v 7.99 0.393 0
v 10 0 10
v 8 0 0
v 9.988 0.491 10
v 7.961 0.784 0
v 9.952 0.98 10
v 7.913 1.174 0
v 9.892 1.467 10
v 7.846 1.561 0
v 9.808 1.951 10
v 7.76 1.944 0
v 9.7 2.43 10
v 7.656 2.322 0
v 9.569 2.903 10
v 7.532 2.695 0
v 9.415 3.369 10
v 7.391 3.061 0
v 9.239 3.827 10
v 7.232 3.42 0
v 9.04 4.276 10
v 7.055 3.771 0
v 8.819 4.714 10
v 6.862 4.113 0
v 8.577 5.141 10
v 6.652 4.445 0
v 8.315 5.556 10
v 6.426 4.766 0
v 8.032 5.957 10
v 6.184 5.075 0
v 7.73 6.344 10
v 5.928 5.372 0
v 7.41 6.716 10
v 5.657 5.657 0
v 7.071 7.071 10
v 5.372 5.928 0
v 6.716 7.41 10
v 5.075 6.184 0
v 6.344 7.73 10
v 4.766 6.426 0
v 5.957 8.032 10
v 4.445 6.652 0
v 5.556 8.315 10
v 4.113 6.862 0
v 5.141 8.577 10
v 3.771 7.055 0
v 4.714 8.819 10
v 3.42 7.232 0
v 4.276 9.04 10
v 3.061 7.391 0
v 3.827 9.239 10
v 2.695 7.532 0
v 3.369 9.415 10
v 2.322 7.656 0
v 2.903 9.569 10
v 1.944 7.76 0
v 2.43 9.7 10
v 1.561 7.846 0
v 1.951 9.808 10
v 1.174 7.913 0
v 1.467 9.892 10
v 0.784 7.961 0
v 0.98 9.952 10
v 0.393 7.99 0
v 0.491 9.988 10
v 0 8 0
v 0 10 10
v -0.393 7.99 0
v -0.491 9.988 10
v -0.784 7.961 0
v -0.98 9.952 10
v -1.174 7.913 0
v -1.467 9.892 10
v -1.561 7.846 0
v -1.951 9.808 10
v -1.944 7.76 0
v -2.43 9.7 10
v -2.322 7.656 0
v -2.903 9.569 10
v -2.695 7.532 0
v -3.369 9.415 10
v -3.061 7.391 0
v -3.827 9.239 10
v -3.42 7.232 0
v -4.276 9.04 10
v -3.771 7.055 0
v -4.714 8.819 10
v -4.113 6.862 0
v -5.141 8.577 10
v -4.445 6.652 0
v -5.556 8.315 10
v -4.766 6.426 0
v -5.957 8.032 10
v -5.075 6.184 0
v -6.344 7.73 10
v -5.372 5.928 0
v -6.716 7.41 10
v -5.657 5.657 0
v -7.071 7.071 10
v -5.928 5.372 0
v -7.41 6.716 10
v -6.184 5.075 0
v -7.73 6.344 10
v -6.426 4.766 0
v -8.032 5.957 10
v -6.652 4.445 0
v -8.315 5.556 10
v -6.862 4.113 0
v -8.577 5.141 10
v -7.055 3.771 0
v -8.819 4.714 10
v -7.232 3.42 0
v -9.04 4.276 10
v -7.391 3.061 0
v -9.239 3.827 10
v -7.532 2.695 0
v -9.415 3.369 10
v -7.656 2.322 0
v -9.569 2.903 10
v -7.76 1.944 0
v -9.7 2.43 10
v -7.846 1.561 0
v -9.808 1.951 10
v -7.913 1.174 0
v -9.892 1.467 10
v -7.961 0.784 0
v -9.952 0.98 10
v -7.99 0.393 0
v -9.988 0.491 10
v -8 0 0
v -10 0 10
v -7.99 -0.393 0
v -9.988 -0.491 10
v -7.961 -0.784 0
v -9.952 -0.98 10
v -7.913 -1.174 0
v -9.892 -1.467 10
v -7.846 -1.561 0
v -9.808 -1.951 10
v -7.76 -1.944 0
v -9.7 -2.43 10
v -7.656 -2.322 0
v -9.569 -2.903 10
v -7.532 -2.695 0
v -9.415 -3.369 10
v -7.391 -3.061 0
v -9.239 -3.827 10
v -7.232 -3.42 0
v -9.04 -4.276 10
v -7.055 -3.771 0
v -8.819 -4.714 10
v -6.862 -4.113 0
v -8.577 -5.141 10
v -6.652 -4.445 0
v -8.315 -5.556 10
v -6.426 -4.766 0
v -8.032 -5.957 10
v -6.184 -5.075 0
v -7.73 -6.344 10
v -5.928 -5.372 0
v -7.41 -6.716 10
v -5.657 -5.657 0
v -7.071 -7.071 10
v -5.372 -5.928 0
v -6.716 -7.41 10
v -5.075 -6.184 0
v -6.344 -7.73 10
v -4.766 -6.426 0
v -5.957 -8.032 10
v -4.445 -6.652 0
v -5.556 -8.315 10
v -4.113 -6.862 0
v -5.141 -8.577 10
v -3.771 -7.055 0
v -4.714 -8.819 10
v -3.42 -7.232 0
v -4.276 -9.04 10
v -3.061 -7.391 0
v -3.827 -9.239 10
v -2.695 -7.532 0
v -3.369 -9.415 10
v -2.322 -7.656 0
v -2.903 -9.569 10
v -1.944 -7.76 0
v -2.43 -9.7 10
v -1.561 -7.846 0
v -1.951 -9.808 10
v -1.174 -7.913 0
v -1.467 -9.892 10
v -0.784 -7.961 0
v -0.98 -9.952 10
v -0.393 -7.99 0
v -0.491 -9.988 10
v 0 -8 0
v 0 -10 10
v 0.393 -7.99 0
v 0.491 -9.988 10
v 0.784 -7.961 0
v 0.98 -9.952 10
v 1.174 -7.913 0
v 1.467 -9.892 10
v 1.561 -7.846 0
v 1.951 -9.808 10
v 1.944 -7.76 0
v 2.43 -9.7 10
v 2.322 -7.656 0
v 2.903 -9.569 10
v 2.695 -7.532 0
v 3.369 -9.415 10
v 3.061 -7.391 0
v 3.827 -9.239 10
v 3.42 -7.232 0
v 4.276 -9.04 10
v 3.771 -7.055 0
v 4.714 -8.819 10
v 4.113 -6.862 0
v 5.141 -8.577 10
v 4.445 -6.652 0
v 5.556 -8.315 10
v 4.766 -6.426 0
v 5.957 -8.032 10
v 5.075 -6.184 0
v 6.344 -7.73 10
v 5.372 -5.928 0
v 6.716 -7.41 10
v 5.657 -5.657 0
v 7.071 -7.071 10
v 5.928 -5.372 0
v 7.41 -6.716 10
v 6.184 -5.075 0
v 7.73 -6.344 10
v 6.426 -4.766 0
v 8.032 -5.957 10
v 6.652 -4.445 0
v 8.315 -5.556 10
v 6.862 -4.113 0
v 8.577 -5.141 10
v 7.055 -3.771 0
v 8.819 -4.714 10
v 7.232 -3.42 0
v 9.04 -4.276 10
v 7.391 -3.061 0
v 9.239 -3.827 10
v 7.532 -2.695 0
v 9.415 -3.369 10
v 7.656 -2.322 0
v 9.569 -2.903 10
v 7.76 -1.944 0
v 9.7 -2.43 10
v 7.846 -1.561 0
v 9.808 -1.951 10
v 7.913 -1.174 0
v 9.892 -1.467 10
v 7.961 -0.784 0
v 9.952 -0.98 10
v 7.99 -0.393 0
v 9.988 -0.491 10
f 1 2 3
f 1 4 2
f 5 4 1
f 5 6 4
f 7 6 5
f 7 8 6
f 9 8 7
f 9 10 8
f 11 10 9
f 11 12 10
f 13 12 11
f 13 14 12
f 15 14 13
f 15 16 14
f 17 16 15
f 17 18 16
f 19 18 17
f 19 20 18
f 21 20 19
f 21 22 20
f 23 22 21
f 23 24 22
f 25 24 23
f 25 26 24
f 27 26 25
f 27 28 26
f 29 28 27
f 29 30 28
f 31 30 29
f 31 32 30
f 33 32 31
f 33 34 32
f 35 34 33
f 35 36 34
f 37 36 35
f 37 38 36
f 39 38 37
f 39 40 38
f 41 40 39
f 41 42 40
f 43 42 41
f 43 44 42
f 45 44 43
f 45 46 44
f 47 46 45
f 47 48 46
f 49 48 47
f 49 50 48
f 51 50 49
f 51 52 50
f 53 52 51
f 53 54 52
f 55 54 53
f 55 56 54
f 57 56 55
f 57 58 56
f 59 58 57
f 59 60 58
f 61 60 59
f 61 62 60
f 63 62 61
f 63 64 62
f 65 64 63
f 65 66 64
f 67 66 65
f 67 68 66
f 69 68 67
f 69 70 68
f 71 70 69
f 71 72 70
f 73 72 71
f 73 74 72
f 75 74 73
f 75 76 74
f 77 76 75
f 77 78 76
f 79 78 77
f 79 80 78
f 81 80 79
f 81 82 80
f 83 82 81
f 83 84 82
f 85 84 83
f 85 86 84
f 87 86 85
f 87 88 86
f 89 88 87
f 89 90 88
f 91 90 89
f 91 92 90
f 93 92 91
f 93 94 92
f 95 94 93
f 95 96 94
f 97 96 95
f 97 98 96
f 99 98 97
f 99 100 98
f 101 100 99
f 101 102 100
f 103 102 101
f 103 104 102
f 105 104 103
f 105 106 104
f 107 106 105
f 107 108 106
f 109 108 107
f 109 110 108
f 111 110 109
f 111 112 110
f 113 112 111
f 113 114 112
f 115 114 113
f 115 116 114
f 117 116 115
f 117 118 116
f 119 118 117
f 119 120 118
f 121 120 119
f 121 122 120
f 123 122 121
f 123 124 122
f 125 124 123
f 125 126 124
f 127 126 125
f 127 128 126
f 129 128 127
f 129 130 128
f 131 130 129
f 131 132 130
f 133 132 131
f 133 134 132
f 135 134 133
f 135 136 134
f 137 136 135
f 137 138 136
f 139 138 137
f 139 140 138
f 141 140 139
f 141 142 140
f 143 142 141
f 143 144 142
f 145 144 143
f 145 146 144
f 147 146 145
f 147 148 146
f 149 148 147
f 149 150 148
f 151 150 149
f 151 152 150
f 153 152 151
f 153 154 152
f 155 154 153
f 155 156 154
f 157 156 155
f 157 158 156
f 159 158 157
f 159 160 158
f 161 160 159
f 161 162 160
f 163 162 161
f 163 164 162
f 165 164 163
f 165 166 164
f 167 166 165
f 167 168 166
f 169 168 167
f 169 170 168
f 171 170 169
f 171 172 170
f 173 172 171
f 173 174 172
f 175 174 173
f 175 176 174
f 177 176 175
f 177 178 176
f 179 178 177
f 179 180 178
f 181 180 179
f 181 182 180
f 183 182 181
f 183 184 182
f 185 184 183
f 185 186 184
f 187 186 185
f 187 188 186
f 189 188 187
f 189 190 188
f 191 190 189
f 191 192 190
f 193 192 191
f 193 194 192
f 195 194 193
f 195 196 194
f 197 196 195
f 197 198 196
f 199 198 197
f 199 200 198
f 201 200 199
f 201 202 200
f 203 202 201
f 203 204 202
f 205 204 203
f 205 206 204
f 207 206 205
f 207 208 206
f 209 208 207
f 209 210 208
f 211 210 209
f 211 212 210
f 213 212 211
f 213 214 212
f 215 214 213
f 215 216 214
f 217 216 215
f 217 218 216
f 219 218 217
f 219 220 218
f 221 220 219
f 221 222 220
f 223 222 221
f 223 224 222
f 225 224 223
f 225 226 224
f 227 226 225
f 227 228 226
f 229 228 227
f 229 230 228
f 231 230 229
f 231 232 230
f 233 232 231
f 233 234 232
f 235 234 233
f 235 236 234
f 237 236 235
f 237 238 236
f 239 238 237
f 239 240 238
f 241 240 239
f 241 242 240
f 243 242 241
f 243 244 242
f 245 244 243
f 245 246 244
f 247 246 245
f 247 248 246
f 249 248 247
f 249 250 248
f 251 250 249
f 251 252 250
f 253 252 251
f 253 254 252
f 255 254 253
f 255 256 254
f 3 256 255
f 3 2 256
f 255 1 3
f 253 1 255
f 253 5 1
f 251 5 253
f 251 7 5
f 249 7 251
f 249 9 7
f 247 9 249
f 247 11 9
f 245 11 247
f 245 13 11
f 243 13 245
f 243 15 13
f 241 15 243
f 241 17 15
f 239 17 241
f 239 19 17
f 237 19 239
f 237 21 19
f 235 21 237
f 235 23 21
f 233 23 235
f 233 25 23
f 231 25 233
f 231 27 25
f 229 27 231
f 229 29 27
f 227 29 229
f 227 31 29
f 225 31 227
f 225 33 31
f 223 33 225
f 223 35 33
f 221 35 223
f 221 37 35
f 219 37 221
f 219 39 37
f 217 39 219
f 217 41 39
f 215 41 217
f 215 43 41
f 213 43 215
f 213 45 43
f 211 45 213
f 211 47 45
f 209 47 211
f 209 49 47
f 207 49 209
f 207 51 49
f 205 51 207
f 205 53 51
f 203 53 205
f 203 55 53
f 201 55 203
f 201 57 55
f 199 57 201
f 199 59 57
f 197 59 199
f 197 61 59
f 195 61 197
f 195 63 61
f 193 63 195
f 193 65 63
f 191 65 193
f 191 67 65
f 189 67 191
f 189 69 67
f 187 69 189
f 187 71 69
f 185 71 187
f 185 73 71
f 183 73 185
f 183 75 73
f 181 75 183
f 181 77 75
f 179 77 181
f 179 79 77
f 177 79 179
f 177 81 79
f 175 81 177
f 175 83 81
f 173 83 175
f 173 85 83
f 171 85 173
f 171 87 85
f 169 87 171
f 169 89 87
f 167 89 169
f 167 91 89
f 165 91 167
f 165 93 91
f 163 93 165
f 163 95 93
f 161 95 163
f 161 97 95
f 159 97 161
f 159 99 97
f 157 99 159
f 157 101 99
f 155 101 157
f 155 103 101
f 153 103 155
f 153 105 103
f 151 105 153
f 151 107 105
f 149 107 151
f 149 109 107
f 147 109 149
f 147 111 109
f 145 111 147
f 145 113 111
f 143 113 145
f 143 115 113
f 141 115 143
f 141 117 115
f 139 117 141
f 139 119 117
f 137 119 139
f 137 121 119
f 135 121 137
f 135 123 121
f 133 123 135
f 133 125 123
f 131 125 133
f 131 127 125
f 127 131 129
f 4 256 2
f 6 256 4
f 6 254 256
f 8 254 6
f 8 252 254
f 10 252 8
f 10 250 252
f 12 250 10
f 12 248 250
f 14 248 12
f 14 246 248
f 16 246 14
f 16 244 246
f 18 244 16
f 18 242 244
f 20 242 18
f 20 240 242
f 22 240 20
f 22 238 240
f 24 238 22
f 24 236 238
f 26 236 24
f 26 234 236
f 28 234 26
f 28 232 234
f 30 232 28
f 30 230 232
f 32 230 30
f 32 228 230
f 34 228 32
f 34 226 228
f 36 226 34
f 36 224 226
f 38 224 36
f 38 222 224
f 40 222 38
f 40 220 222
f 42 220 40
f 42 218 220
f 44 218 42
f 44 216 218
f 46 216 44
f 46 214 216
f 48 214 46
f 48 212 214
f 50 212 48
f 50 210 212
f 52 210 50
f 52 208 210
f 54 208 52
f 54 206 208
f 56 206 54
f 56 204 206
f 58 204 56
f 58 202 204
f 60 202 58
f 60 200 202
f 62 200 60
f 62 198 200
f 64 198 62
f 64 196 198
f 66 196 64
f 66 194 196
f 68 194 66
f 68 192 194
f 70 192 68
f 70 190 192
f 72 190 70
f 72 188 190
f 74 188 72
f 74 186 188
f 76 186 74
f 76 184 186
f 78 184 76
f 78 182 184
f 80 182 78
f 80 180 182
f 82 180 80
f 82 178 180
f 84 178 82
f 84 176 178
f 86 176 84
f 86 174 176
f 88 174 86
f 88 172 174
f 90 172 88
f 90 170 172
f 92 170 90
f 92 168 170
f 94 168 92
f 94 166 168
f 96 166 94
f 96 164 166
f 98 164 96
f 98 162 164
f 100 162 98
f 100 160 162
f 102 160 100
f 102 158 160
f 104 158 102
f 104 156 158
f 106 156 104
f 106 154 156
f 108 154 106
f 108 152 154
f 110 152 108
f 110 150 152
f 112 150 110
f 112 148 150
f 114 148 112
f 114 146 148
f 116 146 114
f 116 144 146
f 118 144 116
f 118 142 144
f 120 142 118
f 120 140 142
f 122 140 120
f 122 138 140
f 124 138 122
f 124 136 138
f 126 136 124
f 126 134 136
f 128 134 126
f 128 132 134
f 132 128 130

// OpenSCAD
/*
// from corner cube
frameExtrusions = [
    0,      // north
    0,      // east
    10,     // south
    10,     // west
    0,      // up
    0       // down
];

unitVectors = [
    [ 1,  0,  0], // north
    [ 0,  1,  0], // east
    [-1,  0,  0], // south
    [ 0, -1,  0], // west
    [ 0,  0,  1], // up
    [ 0,  0, -1]  // down
];
*/

cornerCubeDimensions = [10,10,10];


slack = 0.45            ;

legOuterDim = [10,10,10];
legInnerDim = [5,5,5];

$fn=128;
//
module leg() {
    difference() {
        cube(size=legOuterDim, center=true);
        translate(v=[0,0,(legOuterDim[2]-legInnerDim[2])/2])
        cube(size=[legInnerDim[0]+slack, legInnerDim[1]+slack, legInnerDim[2]+slack], center=true); 
    }
}


module threeJoin() {
// corner cube
    
difference() {
    rotate(a=90, v=[0,0,1])
union() {
cube(size=cornerCubeDimensions, center=true);

translate(v=[0,0,10])
leg();

translate(v=[0,-10,0])
rotate(a=[90,0,0])
leg();

translate(v=[10,0,0])
rotate(a=[0,90,0])
leg();
}
    translate(v=[10,10,-20])
    rotate(a=135, v=[1,-1,0])
    cube(size=[100,100,100]);

}
    
}

    translate(v=[10,10,-20])
    rotate(a=135, v=[1,-1,0])
    *cube(size=[100,100,100]);

module frameBar(slack) {
    cube(size=[20,20,20], center=true);

    translate(v=[(20/2) + (10+slack)/2,0,0])
    cube(size=[10+slack,10+slack,10+slack], center=true);

}

*frameBar(-0.6);
translate(v=[0,30,0])
*frameBar(-0.7);
translate(v=[0,60,0])
*frameBar(-0.8);


translate(v=[0,0,5])
rotate(a=45, v=[1,-1,0])
*threeJoin();

*frameBar();

oslack = 0.05;
module old() {
cube(size=[160,10,10], center=true);

translate(v=[82.5,0,0])
cube(size=[5+oslack,5+oslack,5+oslack], center=true);
    
translate(v=[-82.5,0,0])
cube(size=[5+oslack,5+oslack,5+oslack], center=true);

}



module baseBar() {
    
    
}

cylinder(r1=8, r2=10, h=10);
//old();
